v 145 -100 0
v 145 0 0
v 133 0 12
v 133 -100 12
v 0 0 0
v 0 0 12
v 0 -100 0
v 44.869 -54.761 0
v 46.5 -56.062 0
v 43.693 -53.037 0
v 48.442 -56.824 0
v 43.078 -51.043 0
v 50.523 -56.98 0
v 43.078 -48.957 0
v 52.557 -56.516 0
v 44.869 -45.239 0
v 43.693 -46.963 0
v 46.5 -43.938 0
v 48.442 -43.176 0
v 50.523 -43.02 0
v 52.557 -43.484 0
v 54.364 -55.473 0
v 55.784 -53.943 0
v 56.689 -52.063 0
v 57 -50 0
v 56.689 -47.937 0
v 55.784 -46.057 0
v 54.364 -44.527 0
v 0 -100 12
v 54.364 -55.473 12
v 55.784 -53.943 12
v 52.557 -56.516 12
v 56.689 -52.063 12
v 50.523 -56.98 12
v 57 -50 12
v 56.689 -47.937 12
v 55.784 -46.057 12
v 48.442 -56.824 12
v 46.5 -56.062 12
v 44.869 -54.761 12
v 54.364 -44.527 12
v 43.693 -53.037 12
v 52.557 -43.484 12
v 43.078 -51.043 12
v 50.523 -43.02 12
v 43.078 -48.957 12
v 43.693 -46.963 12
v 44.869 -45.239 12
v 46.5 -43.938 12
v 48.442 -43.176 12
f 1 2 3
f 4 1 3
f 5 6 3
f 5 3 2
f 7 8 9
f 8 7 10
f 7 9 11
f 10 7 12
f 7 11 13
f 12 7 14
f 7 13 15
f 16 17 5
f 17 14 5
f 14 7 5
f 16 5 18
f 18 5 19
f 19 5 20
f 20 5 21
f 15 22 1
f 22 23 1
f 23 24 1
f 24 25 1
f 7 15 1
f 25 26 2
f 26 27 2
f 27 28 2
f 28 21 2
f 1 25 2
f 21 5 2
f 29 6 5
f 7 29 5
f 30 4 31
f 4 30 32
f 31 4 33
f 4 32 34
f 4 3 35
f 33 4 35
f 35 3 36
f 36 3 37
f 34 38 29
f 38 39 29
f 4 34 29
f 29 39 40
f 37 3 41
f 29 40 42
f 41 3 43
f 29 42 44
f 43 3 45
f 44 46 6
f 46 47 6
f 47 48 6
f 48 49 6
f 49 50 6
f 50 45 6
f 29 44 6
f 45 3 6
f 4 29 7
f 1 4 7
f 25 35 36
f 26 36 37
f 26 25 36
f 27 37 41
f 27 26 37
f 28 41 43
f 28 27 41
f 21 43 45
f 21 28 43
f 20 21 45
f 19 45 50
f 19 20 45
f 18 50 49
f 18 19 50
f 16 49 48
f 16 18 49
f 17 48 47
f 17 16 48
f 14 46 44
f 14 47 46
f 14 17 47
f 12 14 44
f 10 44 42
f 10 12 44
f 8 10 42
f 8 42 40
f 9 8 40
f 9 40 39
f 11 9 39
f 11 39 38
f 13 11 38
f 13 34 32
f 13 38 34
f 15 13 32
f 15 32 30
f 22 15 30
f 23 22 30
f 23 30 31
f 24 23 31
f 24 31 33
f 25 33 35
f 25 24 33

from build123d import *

# Parameters (mm, degrees)
F1_DEPTH = 100
F2_R     = 7
F3_DEPTH = 12.001


with BuildPart() as f1:
    # F0 (on Front) → F1 (new body)
    with BuildSketch(Plane.XZ):
        Polygon((0, 12), (0, 0), (145, 0), (133, 12), align=None)
    extrude(amount=F1_DEPTH)

    # F2 (on Top) → F3 (cut, through all)
    with BuildSketch(Plane.XY):
        with Locations((50, -50)):
            Circle(F2_R)
    extrude(amount=F3_DEPTH, mode=Mode.SUBTRACT)


solid = f1.part
